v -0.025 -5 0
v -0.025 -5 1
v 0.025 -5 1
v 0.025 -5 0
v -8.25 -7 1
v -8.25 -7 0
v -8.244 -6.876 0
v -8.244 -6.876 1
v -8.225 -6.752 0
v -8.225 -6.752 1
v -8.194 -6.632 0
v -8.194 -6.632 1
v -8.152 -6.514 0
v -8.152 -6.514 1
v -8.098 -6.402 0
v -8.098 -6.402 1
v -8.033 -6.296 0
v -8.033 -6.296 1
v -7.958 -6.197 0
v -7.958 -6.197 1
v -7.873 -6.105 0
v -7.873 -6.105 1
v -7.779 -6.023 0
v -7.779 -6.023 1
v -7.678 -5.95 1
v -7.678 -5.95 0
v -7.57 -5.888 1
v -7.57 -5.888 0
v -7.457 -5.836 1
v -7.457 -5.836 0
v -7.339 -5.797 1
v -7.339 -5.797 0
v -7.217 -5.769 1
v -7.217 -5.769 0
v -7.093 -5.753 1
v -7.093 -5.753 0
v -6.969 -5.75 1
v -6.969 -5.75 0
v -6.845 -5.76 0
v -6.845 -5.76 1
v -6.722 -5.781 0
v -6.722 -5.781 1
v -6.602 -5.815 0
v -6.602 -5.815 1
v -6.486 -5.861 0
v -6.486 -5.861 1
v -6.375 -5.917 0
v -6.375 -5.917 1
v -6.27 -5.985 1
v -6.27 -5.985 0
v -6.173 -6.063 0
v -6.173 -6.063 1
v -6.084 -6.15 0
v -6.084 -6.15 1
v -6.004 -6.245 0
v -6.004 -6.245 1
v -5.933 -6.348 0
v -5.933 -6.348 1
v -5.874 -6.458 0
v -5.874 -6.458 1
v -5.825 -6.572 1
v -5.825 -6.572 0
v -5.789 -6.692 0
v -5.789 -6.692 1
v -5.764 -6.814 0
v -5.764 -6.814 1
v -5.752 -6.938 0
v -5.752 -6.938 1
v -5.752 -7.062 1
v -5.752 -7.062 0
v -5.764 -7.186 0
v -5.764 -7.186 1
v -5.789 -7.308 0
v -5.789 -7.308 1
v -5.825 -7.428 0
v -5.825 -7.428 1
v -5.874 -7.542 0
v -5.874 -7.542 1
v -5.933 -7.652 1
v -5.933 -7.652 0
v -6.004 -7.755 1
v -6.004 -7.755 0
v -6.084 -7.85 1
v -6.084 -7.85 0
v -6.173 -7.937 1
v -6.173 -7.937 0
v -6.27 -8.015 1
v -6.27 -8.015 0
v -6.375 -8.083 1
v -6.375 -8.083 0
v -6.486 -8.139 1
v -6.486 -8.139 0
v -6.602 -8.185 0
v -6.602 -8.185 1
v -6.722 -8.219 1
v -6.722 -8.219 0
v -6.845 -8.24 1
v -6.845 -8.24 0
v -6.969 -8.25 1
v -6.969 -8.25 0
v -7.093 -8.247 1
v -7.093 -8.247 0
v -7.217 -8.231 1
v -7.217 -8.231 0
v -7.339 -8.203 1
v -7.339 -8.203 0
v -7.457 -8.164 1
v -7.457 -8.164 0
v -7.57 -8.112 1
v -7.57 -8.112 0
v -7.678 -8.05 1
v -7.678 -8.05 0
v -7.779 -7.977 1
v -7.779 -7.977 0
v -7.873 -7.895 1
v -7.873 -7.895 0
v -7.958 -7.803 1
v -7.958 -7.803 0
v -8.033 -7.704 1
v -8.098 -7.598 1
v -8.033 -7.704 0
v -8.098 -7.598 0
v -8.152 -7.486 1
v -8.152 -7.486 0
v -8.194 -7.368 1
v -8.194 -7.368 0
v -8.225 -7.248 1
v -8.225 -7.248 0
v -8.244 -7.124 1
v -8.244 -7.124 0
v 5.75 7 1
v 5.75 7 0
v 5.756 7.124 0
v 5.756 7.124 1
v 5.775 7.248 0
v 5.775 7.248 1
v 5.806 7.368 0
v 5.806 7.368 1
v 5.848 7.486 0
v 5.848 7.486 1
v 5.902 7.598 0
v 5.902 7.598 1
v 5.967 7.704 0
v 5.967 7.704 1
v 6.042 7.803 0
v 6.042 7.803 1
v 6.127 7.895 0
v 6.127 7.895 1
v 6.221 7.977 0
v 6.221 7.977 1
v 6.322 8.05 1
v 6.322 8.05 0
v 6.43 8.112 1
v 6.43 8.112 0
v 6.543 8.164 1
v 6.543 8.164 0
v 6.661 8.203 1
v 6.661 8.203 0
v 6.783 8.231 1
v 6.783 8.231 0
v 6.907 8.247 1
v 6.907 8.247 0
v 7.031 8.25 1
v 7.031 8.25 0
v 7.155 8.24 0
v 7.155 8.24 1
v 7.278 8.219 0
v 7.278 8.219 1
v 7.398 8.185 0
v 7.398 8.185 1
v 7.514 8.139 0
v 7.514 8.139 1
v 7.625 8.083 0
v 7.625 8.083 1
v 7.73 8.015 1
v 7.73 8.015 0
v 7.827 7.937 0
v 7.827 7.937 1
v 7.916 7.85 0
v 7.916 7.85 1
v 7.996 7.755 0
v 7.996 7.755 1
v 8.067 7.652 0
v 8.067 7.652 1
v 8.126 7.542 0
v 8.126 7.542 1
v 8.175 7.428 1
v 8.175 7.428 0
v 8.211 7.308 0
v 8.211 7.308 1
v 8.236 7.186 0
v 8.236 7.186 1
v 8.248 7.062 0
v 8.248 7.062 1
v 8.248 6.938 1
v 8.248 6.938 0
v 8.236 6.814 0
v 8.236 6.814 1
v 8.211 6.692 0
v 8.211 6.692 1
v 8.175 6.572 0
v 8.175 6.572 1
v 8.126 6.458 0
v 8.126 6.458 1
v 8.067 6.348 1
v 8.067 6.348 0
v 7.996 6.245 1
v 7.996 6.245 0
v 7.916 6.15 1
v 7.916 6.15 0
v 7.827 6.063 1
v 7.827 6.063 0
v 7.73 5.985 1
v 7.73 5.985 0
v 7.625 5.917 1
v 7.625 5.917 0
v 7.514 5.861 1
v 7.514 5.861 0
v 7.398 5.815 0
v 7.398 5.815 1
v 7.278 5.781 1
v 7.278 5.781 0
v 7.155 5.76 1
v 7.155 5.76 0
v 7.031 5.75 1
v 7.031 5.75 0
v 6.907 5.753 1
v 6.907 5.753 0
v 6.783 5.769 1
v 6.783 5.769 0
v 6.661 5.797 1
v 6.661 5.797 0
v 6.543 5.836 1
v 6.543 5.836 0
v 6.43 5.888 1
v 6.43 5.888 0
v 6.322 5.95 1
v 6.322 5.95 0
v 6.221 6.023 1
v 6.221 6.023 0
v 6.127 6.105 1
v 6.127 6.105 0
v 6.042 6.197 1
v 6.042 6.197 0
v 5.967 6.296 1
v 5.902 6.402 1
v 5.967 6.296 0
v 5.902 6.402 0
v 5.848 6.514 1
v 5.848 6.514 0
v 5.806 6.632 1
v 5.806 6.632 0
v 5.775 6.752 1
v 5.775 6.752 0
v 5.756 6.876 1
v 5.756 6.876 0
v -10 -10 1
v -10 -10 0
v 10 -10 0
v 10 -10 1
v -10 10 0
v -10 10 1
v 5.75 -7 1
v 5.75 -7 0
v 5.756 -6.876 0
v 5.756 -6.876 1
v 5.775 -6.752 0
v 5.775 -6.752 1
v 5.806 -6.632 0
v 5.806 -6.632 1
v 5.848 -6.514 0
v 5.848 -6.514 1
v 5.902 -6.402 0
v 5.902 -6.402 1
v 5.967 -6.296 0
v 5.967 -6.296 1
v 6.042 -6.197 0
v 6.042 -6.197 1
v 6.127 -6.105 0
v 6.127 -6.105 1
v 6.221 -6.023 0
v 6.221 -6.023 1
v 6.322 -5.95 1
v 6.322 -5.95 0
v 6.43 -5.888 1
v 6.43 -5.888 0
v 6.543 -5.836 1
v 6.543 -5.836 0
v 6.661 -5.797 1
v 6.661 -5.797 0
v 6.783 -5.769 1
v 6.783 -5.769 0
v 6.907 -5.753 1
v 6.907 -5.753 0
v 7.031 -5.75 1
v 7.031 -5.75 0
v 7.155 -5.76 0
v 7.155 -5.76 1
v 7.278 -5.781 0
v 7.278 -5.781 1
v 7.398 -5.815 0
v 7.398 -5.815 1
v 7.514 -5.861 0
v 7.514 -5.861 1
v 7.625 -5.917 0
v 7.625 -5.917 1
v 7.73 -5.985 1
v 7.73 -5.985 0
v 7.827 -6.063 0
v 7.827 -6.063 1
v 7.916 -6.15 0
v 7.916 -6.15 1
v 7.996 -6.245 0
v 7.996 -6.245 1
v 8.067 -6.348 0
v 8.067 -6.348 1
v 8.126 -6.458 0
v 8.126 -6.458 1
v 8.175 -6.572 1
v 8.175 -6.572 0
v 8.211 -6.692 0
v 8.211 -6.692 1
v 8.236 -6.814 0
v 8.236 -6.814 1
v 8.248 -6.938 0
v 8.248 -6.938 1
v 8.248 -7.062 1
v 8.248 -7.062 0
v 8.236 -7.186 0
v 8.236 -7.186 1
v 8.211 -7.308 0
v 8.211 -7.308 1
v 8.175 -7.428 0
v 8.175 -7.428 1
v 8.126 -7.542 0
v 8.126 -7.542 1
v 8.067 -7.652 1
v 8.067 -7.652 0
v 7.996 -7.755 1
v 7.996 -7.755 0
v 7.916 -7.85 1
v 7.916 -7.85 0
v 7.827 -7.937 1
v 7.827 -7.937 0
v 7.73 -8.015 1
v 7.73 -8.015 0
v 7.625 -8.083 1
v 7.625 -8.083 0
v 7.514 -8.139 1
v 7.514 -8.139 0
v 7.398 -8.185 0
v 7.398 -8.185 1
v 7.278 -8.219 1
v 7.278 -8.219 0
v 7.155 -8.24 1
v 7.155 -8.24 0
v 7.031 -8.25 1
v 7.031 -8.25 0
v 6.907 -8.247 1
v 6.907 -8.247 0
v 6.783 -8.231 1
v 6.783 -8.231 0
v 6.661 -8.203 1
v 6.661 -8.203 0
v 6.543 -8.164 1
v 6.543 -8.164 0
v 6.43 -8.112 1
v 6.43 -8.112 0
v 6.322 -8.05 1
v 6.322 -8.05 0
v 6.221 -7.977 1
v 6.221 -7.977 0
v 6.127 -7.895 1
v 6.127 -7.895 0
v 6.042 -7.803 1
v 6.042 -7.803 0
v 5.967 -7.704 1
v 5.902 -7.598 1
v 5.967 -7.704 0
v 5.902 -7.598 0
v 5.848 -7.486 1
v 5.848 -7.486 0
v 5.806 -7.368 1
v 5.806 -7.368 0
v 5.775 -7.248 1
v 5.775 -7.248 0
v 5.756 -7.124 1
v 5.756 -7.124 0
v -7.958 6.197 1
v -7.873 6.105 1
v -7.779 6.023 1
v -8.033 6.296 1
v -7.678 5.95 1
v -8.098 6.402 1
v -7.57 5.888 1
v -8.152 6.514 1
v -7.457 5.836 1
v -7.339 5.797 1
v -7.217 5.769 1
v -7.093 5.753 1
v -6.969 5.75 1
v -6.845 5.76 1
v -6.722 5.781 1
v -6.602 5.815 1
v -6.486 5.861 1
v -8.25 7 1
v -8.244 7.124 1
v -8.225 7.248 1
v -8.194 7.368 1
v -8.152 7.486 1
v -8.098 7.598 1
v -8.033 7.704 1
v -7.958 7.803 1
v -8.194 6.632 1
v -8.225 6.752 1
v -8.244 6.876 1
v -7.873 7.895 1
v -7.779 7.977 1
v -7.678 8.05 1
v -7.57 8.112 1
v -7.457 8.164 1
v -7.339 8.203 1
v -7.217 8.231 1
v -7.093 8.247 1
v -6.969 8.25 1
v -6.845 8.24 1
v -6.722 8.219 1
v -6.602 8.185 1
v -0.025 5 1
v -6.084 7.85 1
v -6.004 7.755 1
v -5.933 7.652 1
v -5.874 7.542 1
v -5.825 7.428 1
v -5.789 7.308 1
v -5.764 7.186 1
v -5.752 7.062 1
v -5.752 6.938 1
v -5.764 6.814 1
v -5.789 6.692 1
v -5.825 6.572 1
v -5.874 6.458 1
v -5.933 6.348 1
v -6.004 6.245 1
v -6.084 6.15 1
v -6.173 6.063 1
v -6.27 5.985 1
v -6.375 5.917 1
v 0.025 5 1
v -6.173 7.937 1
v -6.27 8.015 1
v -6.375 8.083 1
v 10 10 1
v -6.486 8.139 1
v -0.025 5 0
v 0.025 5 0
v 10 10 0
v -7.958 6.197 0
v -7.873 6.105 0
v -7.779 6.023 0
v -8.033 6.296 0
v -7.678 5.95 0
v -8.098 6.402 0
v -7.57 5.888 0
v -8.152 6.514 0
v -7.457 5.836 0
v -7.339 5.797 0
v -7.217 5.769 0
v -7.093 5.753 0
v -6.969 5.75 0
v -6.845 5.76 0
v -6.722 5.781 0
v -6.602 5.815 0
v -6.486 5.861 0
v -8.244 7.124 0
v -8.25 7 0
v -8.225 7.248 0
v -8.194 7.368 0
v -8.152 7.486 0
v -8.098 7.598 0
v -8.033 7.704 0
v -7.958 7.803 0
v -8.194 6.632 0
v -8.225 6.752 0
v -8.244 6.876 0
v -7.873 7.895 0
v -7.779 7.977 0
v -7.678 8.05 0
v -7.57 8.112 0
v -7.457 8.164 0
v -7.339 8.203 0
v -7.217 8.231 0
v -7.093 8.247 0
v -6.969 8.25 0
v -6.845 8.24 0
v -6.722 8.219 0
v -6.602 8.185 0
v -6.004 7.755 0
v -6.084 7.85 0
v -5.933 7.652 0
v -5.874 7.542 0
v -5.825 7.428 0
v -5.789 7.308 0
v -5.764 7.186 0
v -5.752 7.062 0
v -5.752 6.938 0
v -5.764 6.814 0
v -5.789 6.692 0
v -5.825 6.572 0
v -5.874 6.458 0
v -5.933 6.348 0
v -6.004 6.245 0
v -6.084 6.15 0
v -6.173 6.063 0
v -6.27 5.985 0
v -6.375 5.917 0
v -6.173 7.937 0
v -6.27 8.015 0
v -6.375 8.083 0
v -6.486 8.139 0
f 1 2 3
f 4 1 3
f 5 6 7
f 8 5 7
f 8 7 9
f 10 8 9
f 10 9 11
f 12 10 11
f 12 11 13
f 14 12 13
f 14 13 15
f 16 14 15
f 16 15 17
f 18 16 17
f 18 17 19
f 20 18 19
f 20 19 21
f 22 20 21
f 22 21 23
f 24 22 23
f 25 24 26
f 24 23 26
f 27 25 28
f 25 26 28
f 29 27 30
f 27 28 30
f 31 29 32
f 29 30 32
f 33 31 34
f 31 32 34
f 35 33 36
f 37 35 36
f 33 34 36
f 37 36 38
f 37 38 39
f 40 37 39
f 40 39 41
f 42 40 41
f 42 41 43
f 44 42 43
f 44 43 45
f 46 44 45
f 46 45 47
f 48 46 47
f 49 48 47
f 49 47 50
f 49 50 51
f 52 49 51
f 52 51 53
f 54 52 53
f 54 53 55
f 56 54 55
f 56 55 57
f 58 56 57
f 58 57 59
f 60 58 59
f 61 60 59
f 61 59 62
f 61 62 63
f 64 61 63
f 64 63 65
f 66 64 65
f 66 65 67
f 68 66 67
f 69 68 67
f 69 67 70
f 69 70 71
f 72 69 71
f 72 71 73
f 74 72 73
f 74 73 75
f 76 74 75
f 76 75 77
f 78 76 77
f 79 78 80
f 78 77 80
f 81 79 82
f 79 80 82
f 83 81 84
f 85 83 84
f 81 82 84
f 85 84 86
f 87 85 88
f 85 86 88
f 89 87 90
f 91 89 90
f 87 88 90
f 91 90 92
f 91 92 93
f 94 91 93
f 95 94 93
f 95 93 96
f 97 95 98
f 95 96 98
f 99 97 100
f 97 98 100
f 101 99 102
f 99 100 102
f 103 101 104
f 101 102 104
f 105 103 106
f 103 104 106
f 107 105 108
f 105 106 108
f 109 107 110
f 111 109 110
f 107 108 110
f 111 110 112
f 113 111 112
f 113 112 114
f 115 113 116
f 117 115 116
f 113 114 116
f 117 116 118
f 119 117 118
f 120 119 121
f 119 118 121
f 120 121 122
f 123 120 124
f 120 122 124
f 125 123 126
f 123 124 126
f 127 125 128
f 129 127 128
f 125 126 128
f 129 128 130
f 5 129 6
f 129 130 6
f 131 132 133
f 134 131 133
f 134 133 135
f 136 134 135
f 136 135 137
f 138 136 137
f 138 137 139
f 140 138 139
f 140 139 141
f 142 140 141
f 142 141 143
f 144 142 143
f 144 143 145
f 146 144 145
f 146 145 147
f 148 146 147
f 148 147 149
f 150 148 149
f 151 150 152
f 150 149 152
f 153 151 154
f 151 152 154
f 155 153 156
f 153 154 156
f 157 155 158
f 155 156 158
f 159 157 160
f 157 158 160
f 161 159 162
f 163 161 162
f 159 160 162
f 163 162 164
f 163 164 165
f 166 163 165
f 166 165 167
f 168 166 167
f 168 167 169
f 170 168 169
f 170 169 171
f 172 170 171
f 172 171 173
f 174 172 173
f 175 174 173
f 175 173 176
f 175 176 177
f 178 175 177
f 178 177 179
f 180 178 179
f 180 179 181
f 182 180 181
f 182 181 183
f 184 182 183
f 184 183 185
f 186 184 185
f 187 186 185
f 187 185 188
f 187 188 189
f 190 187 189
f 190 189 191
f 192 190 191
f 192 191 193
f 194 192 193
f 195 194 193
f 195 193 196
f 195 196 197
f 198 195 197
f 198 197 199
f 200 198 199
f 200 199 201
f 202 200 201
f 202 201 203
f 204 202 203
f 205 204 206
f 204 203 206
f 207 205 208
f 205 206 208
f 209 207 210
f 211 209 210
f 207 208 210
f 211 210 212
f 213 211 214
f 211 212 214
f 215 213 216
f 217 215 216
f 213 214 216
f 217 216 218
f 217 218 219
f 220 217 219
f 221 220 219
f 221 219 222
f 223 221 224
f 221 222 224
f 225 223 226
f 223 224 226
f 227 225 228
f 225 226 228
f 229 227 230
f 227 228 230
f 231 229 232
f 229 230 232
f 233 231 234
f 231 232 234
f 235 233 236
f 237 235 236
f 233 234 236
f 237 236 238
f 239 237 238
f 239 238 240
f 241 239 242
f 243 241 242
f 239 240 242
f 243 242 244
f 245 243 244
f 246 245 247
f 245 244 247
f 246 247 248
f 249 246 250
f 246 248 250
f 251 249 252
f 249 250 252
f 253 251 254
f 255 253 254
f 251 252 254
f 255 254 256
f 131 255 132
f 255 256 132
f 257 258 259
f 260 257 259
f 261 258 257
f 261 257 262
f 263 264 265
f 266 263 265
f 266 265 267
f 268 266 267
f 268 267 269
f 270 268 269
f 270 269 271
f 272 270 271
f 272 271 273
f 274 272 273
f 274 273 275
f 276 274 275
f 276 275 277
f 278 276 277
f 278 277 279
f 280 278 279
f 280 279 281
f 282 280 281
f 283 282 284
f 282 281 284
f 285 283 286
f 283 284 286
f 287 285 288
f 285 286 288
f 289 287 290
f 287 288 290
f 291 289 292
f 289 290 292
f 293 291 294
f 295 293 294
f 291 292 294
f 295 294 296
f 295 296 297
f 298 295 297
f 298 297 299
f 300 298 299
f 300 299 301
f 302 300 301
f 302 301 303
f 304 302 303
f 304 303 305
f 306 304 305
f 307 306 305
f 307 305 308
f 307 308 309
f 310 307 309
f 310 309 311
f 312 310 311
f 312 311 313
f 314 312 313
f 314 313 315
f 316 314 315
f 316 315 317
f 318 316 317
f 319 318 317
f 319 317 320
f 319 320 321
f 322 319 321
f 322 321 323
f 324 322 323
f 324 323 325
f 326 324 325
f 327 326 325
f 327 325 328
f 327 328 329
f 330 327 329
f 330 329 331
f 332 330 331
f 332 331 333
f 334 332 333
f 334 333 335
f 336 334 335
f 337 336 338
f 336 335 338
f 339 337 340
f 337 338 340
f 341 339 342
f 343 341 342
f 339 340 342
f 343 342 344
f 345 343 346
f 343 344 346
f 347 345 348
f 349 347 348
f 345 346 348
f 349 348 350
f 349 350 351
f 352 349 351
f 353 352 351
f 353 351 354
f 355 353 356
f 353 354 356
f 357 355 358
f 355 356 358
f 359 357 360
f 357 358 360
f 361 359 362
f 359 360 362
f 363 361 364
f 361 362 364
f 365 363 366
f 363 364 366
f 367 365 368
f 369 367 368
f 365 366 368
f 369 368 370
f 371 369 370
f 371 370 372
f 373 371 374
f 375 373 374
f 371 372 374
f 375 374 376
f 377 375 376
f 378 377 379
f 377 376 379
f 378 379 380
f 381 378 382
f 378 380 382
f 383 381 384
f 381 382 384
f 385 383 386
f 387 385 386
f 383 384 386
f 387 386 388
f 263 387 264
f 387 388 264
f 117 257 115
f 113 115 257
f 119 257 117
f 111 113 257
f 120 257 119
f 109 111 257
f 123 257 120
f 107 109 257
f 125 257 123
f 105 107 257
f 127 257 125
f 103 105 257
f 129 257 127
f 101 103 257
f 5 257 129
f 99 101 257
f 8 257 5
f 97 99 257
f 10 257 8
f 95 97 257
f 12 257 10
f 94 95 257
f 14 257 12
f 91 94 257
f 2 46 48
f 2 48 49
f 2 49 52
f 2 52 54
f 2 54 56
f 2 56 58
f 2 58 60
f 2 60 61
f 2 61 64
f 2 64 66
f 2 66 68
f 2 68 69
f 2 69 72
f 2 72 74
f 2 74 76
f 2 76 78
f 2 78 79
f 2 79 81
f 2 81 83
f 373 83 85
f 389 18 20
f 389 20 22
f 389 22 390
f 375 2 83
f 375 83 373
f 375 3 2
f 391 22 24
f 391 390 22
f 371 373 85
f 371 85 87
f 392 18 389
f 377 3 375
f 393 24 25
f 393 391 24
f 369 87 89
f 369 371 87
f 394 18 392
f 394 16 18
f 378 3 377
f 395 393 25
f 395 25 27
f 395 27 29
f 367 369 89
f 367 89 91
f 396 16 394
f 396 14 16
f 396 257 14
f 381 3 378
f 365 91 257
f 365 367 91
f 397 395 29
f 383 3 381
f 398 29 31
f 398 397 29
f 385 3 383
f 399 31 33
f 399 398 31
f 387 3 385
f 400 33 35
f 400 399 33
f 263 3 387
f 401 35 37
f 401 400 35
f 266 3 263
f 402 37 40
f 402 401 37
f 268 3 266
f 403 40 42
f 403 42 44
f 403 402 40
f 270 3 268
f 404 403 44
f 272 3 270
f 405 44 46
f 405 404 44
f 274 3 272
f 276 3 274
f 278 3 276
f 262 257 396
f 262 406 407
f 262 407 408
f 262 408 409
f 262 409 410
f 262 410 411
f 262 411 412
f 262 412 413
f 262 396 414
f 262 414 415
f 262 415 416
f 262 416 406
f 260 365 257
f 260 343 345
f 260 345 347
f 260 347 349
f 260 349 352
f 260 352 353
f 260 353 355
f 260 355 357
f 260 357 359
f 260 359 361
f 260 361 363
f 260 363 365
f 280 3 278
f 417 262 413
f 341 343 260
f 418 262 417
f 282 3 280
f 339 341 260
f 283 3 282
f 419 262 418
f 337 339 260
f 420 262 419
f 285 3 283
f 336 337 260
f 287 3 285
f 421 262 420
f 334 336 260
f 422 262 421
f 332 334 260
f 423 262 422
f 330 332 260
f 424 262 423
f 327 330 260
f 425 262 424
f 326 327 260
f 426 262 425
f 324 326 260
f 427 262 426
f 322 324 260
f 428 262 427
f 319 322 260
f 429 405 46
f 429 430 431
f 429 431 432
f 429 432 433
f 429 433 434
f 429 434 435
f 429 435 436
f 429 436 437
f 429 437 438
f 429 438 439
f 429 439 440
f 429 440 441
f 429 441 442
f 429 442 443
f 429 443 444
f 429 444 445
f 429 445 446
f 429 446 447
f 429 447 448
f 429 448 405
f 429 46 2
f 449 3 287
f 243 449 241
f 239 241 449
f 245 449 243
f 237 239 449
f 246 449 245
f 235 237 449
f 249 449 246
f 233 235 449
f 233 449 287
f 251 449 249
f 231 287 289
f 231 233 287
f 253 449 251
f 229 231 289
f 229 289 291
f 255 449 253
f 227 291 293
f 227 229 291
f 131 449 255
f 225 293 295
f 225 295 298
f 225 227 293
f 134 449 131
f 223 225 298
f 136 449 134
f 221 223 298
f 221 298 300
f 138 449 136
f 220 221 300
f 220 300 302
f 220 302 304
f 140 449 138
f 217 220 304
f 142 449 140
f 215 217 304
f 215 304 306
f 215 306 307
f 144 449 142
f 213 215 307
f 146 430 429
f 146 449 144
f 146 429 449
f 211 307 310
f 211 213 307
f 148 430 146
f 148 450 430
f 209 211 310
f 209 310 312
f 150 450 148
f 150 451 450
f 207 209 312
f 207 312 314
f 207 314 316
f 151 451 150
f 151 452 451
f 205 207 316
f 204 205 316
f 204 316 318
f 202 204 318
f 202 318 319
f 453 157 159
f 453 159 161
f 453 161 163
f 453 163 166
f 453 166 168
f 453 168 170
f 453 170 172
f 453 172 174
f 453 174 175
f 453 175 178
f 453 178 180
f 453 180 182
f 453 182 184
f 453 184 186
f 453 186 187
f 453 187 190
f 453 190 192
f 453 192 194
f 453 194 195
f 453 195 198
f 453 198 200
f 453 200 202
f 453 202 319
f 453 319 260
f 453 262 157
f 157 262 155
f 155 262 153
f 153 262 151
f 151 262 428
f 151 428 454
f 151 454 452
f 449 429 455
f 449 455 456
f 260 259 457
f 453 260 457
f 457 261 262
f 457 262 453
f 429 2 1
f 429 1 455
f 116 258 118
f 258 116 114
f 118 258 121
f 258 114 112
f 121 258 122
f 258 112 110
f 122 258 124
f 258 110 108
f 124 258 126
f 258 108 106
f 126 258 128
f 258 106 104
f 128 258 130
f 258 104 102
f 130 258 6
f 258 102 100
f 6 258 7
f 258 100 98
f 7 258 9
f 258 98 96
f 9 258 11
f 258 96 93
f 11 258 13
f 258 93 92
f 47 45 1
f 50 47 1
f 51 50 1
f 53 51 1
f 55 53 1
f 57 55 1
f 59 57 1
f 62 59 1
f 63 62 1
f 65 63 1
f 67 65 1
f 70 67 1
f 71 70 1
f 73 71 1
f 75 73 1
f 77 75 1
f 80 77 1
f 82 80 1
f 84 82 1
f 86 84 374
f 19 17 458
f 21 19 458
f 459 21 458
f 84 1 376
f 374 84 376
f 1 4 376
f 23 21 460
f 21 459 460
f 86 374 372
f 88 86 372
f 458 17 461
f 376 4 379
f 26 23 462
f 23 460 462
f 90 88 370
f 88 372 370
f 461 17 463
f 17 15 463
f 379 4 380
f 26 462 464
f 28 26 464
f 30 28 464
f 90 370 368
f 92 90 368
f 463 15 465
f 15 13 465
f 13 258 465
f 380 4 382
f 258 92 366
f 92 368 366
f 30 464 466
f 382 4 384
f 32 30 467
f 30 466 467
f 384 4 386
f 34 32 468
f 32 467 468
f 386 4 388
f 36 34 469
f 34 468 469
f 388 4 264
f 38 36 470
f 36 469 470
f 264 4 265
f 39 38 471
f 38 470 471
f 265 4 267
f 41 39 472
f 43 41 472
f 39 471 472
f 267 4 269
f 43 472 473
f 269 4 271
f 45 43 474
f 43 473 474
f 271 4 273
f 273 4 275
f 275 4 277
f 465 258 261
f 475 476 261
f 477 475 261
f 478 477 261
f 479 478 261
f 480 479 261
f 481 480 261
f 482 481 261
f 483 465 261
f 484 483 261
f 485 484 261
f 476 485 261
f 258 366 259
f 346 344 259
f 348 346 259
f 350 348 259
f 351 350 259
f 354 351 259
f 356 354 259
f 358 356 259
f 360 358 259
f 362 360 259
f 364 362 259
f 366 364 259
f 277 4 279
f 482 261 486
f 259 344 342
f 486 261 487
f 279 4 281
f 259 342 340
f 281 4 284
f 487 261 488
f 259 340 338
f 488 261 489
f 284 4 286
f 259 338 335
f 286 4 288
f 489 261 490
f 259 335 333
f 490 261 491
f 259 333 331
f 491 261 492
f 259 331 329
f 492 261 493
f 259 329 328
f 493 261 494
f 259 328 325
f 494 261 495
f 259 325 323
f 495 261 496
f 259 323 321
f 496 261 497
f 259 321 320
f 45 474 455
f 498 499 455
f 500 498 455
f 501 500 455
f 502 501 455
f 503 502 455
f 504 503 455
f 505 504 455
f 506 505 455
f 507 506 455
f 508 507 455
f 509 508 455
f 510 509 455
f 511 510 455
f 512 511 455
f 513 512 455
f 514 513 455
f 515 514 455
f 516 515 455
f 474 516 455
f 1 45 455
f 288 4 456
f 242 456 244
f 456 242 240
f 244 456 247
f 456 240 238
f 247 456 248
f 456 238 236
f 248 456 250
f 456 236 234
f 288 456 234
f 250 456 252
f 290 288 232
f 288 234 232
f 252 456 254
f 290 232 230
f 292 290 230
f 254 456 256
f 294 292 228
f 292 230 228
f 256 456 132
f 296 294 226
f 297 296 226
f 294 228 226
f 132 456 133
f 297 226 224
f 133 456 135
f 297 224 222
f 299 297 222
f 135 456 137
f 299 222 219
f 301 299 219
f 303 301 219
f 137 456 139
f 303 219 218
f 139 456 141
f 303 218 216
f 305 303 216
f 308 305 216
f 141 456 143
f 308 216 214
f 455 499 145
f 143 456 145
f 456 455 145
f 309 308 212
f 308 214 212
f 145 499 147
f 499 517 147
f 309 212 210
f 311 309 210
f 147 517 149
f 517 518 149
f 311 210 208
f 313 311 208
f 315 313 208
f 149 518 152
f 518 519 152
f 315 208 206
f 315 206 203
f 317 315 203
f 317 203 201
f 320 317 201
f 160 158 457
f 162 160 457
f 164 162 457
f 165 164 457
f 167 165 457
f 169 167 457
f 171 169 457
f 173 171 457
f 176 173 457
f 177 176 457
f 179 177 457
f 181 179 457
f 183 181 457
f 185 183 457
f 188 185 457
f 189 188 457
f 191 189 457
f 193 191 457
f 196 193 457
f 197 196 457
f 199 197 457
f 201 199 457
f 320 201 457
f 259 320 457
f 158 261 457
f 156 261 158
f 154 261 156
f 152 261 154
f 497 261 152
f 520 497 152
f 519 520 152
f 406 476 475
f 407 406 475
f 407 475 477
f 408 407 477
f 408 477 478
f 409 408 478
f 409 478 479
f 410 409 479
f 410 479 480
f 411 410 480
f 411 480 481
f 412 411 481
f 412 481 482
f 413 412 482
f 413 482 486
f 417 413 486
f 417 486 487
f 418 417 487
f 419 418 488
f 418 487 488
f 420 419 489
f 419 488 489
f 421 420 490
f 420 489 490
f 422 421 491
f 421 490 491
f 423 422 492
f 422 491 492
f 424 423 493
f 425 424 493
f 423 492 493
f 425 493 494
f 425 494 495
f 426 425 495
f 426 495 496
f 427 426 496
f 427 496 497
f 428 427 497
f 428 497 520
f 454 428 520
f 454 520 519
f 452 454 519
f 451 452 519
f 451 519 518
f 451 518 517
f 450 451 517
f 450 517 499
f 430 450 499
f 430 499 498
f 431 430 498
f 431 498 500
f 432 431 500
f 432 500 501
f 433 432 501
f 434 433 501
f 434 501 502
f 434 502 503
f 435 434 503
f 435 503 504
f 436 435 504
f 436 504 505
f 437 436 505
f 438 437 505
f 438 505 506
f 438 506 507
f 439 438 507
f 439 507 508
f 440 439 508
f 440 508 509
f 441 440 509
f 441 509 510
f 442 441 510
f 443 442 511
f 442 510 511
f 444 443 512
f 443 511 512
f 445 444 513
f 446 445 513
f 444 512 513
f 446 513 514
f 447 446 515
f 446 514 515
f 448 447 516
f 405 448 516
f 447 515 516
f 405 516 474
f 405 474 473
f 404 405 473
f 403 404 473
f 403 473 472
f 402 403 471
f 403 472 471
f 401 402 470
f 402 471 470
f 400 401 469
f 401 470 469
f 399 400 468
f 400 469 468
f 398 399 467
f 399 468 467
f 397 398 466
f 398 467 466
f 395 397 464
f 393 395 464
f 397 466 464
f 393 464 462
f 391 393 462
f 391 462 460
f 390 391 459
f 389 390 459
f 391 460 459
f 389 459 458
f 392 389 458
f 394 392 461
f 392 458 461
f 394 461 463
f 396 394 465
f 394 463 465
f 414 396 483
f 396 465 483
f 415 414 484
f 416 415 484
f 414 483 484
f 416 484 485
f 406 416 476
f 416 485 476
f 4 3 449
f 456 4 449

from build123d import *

# Parameters (mm, degrees)
F0_W     = 20
F0_H     = 20
F1_DEPTH = 1
F2_W     = 0.05
F2_H     = 10
F3_DEPTH = 25
F5_D     = 2.5


with BuildPart() as f1:
    # F0 (on Top) → F1 (new body)
    with BuildSketch(Plane.XY):
        Rectangle(F0_W, F0_H)
    extrude(amount=F1_DEPTH)

    # F2 (on face) → F3 (cut)
    with BuildSketch(Plane.XY.offset(1)):
        Rectangle(F2_W, F2_H)
    extrude(amount=-F3_DEPTH, mode=Mode.SUBTRACT)

    # F5 (through all)
    with Locations(Plane.XY.offset(1)):
        with Locations((-7, -7), (7, -7), (7, 7), (-7, 7)):
            Hole(F5_D / 2)


solid = f1.part
